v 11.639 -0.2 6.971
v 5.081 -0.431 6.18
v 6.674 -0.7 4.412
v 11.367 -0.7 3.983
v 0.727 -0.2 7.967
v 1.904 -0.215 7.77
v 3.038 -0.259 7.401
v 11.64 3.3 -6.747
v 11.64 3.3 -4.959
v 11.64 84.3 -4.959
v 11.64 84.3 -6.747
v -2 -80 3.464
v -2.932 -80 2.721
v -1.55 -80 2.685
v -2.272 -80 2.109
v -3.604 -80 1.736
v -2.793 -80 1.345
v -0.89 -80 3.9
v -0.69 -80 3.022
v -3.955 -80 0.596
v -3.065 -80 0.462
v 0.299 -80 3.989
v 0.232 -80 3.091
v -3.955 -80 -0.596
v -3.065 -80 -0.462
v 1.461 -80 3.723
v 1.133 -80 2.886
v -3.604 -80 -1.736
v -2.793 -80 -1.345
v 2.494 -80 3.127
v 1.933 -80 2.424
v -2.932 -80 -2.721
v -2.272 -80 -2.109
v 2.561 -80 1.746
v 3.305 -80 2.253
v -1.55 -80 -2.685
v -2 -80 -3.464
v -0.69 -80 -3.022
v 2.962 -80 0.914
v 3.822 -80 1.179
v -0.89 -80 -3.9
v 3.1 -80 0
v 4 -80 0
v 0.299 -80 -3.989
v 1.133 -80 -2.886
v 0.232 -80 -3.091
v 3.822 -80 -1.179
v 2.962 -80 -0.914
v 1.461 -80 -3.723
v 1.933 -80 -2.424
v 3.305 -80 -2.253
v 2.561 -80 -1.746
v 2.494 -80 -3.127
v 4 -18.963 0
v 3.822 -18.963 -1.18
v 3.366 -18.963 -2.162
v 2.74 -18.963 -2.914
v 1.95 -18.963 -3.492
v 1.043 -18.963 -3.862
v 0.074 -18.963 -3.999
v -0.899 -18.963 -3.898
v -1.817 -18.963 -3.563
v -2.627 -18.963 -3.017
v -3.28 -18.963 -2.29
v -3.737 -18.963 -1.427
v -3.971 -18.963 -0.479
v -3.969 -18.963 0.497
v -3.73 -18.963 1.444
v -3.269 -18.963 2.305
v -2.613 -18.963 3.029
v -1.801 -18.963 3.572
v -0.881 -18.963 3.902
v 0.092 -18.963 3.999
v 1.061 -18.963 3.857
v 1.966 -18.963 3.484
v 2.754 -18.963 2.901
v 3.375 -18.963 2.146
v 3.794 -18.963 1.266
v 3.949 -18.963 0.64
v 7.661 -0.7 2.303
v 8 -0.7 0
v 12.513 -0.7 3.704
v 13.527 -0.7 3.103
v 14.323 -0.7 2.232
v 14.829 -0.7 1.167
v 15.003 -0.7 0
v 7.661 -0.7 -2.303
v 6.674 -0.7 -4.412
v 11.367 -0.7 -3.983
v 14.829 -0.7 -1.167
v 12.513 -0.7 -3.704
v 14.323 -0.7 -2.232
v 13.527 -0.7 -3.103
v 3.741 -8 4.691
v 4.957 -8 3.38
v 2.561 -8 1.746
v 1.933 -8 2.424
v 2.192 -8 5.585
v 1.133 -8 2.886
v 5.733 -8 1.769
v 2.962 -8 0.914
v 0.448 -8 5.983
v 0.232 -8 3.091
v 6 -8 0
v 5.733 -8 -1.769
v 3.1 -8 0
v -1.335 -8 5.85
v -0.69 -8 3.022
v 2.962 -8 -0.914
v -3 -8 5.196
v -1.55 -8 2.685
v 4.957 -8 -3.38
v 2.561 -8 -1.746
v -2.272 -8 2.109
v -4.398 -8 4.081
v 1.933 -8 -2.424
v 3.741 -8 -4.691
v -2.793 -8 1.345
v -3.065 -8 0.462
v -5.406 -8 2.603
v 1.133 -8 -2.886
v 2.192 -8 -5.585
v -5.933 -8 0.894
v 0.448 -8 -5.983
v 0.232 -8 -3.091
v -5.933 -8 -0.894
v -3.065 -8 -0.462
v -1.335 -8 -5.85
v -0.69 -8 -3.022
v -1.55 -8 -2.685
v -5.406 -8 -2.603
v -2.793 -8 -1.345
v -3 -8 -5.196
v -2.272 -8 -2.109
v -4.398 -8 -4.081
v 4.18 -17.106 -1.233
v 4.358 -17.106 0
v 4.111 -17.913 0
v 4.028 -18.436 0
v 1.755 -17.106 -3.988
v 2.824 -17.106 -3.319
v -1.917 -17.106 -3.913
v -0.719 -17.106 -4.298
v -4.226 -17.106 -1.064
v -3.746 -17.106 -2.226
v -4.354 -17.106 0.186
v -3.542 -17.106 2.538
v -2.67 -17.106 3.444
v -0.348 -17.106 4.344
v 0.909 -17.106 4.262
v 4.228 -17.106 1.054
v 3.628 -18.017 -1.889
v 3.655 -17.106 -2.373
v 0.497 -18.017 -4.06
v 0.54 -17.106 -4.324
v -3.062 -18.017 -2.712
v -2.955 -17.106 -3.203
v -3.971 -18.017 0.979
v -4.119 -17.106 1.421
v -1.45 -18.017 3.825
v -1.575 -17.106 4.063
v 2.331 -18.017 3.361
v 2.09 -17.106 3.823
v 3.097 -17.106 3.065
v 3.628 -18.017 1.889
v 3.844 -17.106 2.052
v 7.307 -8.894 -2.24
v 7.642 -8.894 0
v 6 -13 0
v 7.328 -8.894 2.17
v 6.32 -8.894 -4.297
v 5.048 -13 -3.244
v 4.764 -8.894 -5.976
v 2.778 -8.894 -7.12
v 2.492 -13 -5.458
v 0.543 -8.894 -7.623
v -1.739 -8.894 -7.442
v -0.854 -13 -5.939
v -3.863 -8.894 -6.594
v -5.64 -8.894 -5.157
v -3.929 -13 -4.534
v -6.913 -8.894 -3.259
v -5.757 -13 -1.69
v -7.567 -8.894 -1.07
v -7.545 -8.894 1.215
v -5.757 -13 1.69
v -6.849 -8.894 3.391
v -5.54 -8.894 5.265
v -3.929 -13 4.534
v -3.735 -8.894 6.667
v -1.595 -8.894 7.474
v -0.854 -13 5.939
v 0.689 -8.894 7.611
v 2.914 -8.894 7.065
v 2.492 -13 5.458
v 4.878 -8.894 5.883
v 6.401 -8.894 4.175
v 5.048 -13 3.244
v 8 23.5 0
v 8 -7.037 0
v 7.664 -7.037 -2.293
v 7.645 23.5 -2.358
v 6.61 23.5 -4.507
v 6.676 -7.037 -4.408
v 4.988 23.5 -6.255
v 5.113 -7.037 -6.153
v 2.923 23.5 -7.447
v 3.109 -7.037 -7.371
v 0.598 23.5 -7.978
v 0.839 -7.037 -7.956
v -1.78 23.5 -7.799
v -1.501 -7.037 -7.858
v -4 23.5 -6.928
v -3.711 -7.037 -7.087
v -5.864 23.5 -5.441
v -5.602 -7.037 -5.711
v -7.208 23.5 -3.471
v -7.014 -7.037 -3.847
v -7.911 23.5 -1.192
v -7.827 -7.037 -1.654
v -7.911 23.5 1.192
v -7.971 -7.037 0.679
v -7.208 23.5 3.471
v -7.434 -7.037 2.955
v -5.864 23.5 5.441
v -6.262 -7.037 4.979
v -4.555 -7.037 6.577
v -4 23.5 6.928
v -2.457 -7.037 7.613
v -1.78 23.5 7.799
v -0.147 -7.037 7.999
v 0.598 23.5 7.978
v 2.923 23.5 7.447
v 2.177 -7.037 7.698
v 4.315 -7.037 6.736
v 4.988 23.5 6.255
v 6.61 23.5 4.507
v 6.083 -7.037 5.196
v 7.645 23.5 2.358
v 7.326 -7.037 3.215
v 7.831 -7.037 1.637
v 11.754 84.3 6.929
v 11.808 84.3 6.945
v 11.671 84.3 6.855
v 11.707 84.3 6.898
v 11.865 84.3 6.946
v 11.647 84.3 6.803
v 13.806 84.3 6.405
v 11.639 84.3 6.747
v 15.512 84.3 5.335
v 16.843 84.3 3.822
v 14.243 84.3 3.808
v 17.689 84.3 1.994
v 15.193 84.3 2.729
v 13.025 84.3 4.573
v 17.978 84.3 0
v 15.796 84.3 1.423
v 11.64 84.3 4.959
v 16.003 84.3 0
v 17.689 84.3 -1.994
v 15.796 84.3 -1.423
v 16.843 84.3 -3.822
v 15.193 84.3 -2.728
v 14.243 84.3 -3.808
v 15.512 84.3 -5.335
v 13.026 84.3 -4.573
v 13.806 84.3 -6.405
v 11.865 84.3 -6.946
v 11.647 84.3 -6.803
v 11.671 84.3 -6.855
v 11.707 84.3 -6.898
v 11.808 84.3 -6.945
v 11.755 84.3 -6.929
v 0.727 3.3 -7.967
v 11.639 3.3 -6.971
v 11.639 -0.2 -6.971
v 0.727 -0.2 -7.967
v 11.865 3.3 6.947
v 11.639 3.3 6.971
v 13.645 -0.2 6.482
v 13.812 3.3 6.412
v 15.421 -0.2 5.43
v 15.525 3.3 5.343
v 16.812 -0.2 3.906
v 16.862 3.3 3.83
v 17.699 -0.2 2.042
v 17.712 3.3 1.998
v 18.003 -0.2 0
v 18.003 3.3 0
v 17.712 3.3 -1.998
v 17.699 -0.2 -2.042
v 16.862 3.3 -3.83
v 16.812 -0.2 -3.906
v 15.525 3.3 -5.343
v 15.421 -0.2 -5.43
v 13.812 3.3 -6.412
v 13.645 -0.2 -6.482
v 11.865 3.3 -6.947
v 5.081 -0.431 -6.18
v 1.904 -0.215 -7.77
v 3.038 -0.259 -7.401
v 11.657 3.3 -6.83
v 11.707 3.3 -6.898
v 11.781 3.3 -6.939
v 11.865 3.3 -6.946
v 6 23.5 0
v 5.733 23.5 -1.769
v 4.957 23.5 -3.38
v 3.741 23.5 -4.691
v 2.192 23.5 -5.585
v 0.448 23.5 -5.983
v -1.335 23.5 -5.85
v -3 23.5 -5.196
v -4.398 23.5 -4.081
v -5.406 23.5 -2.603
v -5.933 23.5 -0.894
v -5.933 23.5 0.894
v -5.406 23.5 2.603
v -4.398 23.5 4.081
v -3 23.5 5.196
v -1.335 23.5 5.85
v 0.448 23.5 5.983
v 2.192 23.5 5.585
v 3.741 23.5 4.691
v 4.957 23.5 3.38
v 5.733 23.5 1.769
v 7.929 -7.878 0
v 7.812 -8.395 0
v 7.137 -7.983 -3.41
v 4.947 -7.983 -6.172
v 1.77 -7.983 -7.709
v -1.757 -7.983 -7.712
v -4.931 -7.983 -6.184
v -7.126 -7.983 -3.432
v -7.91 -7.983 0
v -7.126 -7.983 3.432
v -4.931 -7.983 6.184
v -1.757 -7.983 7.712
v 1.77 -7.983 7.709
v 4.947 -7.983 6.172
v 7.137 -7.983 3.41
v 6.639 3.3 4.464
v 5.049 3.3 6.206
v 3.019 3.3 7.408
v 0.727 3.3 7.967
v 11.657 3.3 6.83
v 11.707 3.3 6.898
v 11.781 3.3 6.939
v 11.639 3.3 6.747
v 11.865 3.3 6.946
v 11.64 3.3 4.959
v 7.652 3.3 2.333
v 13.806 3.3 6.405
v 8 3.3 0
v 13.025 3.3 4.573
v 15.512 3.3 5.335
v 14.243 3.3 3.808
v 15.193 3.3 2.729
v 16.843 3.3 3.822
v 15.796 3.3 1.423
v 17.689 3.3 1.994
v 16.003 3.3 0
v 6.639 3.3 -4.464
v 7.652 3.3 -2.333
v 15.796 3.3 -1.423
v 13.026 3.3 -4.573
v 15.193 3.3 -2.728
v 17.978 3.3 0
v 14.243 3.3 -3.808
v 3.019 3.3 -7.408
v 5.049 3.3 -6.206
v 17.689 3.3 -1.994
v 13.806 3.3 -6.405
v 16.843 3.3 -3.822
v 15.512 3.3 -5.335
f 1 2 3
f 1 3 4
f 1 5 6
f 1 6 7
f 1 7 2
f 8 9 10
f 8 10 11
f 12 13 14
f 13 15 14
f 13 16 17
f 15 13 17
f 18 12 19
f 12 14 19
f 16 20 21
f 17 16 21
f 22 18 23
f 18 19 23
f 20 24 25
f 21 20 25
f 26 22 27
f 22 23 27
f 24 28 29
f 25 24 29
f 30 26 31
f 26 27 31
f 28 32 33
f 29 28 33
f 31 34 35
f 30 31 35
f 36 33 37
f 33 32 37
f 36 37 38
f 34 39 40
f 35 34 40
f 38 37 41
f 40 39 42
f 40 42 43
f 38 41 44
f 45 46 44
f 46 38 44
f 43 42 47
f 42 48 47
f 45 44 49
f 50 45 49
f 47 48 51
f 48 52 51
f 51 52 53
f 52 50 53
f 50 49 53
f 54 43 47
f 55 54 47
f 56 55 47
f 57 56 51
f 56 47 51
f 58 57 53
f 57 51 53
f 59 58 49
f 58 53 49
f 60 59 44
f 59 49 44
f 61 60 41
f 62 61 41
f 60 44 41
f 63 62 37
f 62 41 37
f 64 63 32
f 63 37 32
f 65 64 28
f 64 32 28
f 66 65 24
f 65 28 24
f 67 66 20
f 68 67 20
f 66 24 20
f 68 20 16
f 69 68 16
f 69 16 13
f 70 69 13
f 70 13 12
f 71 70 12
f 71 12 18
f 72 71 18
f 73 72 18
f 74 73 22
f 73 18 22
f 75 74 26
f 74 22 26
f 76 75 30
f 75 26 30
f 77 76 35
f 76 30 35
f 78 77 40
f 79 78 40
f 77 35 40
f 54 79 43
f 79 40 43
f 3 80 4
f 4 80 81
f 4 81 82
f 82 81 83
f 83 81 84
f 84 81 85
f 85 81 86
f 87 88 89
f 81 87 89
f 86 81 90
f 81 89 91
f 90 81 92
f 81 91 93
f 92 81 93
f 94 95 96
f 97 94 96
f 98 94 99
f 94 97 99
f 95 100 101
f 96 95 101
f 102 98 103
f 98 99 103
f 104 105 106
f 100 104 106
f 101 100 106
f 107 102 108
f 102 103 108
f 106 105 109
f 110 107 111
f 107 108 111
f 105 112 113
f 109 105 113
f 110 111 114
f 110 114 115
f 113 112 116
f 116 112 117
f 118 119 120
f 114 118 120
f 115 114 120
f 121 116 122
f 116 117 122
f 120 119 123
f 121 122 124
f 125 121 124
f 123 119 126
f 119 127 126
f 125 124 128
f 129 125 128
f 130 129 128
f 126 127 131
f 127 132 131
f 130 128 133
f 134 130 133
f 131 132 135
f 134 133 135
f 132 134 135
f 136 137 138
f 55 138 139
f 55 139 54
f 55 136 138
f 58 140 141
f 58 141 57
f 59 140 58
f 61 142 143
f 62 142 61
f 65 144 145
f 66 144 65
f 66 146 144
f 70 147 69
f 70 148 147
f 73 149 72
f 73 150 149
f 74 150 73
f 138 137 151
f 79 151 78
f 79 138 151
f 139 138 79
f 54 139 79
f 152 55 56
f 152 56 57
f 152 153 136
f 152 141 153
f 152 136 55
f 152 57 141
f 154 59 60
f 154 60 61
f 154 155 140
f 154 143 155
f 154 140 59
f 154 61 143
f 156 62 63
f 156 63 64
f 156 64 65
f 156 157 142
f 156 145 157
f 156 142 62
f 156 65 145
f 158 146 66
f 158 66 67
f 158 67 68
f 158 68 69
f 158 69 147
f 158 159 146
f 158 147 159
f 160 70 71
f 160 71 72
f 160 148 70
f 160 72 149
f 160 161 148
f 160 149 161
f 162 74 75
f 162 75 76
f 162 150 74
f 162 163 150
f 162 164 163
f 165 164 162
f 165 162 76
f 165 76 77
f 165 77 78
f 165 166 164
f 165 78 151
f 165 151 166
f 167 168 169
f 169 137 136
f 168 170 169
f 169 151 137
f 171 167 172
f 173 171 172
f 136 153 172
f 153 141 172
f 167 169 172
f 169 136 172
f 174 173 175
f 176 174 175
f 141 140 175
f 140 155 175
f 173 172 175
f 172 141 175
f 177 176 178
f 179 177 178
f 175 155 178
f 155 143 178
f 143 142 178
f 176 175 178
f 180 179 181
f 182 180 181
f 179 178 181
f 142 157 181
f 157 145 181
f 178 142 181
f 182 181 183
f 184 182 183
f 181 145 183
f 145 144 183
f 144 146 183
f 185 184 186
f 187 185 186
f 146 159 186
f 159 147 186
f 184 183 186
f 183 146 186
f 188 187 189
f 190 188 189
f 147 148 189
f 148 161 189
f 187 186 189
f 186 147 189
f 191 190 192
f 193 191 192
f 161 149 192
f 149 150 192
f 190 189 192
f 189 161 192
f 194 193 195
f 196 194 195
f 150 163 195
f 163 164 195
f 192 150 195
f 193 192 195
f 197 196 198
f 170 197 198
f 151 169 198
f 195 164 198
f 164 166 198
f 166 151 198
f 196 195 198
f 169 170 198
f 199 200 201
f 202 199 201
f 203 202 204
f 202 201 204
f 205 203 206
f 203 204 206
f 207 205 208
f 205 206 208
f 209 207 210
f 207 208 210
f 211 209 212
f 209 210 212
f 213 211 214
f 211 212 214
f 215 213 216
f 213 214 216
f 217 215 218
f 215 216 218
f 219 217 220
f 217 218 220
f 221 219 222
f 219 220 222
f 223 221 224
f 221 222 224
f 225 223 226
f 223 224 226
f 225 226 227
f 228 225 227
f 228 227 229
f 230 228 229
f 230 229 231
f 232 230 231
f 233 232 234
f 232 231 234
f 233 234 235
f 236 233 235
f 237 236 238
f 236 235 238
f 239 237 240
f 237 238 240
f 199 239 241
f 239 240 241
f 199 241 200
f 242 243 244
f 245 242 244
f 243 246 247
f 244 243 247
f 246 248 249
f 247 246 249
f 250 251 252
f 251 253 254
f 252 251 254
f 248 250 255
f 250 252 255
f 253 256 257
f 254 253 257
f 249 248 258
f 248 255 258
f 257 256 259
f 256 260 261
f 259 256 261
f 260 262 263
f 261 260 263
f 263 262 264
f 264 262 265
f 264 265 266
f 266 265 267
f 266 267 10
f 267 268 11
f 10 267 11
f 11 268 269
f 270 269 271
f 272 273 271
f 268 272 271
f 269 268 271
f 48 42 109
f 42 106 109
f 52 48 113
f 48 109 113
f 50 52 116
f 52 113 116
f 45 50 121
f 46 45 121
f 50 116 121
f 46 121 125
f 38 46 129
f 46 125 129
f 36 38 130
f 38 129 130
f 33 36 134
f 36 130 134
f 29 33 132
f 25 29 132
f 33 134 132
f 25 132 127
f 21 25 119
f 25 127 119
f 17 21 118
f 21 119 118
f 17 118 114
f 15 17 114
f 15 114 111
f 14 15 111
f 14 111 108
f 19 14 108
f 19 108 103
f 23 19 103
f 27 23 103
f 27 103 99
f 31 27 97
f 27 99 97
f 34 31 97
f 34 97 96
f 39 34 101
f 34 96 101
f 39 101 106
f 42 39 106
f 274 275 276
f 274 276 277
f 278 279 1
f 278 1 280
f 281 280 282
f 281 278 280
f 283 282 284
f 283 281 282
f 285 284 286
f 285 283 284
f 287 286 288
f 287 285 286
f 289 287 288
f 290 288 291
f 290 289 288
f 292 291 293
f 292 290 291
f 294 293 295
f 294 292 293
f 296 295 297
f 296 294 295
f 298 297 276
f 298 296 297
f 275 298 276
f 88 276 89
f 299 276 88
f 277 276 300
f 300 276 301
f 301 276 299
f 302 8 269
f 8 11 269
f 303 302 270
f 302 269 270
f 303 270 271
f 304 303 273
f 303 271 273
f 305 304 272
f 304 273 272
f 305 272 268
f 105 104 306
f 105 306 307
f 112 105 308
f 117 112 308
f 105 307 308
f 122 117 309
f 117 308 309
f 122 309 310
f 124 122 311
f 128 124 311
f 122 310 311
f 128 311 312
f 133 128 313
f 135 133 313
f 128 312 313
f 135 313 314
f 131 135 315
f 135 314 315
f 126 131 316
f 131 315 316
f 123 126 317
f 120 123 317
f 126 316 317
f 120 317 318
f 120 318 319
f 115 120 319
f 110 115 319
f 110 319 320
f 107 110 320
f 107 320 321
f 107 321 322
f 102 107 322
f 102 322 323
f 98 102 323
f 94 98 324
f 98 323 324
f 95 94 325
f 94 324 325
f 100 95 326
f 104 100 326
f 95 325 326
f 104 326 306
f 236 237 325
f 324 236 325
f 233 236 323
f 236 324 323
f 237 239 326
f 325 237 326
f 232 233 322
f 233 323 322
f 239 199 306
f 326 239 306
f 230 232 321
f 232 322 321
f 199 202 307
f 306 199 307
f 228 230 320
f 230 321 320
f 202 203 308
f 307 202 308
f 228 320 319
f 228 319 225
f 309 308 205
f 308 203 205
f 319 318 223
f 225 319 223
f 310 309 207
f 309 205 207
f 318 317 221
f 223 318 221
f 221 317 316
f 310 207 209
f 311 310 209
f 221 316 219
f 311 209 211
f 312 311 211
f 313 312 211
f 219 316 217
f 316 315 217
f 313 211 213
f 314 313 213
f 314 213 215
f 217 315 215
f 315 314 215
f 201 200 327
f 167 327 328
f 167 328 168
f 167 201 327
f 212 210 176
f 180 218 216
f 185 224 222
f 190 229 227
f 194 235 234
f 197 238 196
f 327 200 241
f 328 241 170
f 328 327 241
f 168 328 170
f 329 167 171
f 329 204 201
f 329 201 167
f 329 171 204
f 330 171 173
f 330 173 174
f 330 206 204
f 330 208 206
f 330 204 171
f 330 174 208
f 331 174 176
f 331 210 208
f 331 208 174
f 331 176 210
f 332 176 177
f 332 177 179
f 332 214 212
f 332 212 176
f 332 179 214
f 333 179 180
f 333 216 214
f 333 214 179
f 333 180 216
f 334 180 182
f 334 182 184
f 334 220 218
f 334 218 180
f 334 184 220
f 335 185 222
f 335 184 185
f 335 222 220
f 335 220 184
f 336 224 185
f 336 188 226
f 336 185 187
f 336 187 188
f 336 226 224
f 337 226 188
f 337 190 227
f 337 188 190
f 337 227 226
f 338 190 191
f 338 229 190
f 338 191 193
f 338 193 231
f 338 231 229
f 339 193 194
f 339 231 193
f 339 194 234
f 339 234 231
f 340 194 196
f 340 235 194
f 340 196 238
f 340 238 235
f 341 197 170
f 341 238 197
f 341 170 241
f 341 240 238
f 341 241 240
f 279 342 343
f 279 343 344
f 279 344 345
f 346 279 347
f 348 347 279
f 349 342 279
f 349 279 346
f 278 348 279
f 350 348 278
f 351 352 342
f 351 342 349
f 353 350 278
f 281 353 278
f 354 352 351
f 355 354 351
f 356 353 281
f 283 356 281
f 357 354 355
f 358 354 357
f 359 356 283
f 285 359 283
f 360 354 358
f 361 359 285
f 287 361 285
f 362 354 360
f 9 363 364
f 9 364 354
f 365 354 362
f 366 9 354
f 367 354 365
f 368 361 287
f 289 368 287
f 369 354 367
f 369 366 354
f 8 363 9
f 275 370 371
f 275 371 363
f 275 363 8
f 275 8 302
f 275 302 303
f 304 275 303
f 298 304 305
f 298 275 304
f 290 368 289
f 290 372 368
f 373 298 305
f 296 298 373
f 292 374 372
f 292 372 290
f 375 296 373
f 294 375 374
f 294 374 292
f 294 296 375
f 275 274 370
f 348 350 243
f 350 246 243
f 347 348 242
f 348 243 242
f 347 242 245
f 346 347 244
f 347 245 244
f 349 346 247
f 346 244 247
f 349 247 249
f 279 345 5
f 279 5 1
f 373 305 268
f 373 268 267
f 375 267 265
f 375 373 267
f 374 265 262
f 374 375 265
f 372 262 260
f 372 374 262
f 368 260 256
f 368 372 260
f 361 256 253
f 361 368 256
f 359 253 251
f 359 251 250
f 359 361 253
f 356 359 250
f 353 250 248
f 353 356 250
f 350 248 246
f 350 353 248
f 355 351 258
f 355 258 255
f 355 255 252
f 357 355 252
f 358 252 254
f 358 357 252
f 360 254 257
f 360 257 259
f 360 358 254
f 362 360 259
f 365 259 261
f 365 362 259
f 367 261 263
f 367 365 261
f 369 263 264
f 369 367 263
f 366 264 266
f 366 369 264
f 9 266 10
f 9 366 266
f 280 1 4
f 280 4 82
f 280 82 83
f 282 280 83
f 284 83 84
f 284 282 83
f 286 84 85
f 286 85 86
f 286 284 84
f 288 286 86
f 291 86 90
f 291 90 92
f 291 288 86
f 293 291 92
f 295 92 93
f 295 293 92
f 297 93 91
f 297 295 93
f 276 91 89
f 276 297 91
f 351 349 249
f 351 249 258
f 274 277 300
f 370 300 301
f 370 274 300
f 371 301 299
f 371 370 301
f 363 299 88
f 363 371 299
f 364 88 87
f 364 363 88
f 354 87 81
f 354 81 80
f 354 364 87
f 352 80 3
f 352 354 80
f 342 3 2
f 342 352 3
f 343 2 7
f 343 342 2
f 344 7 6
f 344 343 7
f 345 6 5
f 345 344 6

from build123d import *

# Parameters (mm, degrees)
FILLET_1_R      = 5
EXTRUDE_1_DEPTH = 4
CHAMFER_1_SIZE  = 3
CHAMFER_1_SIZE2 = 0.5
EXTRUDE_2_DEPTH = 81
FILLET_2_R      = 0.2


with BuildPart() as part:
    # Эскиз1 → Повернуть1 (revolve)
    with BuildSketch(Plane.XY):
        Polygon((8, 23.5), (8, -8), (4, -18), (4, -80), (3.1, -80), (3.1, -8), (6, -8), (6, 23.5), align=None)
    revolve(axis=Axis((0, -1000, 0), (0, 1, 0)))

    # Скругление1
    fillet_1_edges = [part.edges().sort_by_distance(p)[0] for p in [
        (-8, -8, 0),
        (-4, -18, 0),
    ]]
    fillet(fillet_1_edges, radius=FILLET_1_R)


with BuildPart() as body_2:
    # Эскиз2 → Бобышка-Вытянуть1 (new body)
    with BuildSketch(Plane(origin=(0, 3.3, 0), x_dir=(1, 0, 0), z_dir=(0, 1, 0))):
        with BuildLine():
            Line((11.639394602, 6.971030521), (0.727071693, 7.966905416))
            ThreePointArc((0.727071693, 7.966905416), (8.000013447, -4.909e-06), (0.727061916, -7.966906308))
            Line((0.727061916, -7.966906308), (11.639394602, -6.971030521))
            ThreePointArc((11.639394602, -6.971030521), (18.00320794, 0), (11.639394602, 6.971030521))
        make_face()
    extrude(amount=-EXTRUDE_1_DEPTH)

    # Фаска1
    chamfer_1_edges = [body_2.edges().sort_by_distance(p)[0] for p in [
        (18.00320794, -0.7, 0),
        (6.183233147, -0.7, -7.468967969),
        (6.183228259, -0.7, 7.468968415),
    ]]
    chamfer_1_side = [body_2.faces().sort_by_distance(p)[0] for p in [
        (11.436559393, -0.7, 0),
    ]]
    chamfer(chamfer_1_edges, length=CHAMFER_1_SIZE, length2=CHAMFER_1_SIZE2, reference=chamfer_1_side[0])

    # Эскиз3 → Бобышка-Вытянуть2 (add)
    with BuildSketch(Plane(origin=(0, 3.3, 0), x_dir=(1, 0, 0), z_dir=(0, 1, 0))):
        with BuildLine():
            Line((11.64037122, 4.959236126), (11.639394602, 6.971030521))
            ThreePointArc((11.639394602, 6.971030521), (17.978333284, 0), (11.639394602, -6.971030521))
            Line((11.639394602, -6.971030521), (11.640066766, -4.959275233))
            ThreePointArc((11.640066766, -4.959275233), (16.003207938, -0.000153478), (11.64037122, 4.959236126))
        make_face()
    extrude(amount=EXTRUDE_2_DEPTH)

    # Скругление2
    fillet_2_edges = [body_2.edges().sort_by_distance(p)[0] for p in [
        (11.639394602, 43.8, 6.971030521),
        (11.639394602, 43.8, -6.971030521),
    ]]
    fillet(fillet_2_edges, radius=FILLET_2_R)


solid = Compound([part.part, body_2.part])
